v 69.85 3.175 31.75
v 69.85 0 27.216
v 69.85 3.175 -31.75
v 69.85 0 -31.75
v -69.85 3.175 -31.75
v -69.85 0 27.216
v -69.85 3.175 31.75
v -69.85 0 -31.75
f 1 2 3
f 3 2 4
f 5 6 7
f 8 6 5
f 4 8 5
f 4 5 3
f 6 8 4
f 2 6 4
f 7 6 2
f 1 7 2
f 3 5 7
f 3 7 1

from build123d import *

# Parameters (mm, degrees)
SKETCH1_W           = 139.7
SKETCH1_H           = 63.5
BOSS_EXTRUDE1_DEPTH = 3.175
CHAMFER1_SIZE2      = 4.534369921
CHAMFER1_SIZE       = 3.175


with BuildPart() as part:
    # Sketch1 → Boss-Extrude1 (new body)
    with BuildSketch(Plane(origin=(0, 0, 0), x_dir=(1, 0, 0), z_dir=(0, 1, 0))):
        Rectangle(SKETCH1_W, SKETCH1_H)
    extrude(amount=BOSS_EXTRUDE1_DEPTH)

    # Chamfer1
    chamfer1_edges = [part.edges().sort_by_distance(p)[0] for p in [
        (0, 0, 31.75),
    ]]
    chamfer1_side = [part.faces().sort_by_distance(p)[0] for p in [
        (0, 0.0635, 31.75),
    ]]
    chamfer(chamfer1_edges, length=CHAMFER1_SIZE - 0.0001, length2=CHAMFER1_SIZE2 - 0.0001, reference=chamfer1_side[0])  # a hair under: the kernel refuses the full size


solid = part.part
